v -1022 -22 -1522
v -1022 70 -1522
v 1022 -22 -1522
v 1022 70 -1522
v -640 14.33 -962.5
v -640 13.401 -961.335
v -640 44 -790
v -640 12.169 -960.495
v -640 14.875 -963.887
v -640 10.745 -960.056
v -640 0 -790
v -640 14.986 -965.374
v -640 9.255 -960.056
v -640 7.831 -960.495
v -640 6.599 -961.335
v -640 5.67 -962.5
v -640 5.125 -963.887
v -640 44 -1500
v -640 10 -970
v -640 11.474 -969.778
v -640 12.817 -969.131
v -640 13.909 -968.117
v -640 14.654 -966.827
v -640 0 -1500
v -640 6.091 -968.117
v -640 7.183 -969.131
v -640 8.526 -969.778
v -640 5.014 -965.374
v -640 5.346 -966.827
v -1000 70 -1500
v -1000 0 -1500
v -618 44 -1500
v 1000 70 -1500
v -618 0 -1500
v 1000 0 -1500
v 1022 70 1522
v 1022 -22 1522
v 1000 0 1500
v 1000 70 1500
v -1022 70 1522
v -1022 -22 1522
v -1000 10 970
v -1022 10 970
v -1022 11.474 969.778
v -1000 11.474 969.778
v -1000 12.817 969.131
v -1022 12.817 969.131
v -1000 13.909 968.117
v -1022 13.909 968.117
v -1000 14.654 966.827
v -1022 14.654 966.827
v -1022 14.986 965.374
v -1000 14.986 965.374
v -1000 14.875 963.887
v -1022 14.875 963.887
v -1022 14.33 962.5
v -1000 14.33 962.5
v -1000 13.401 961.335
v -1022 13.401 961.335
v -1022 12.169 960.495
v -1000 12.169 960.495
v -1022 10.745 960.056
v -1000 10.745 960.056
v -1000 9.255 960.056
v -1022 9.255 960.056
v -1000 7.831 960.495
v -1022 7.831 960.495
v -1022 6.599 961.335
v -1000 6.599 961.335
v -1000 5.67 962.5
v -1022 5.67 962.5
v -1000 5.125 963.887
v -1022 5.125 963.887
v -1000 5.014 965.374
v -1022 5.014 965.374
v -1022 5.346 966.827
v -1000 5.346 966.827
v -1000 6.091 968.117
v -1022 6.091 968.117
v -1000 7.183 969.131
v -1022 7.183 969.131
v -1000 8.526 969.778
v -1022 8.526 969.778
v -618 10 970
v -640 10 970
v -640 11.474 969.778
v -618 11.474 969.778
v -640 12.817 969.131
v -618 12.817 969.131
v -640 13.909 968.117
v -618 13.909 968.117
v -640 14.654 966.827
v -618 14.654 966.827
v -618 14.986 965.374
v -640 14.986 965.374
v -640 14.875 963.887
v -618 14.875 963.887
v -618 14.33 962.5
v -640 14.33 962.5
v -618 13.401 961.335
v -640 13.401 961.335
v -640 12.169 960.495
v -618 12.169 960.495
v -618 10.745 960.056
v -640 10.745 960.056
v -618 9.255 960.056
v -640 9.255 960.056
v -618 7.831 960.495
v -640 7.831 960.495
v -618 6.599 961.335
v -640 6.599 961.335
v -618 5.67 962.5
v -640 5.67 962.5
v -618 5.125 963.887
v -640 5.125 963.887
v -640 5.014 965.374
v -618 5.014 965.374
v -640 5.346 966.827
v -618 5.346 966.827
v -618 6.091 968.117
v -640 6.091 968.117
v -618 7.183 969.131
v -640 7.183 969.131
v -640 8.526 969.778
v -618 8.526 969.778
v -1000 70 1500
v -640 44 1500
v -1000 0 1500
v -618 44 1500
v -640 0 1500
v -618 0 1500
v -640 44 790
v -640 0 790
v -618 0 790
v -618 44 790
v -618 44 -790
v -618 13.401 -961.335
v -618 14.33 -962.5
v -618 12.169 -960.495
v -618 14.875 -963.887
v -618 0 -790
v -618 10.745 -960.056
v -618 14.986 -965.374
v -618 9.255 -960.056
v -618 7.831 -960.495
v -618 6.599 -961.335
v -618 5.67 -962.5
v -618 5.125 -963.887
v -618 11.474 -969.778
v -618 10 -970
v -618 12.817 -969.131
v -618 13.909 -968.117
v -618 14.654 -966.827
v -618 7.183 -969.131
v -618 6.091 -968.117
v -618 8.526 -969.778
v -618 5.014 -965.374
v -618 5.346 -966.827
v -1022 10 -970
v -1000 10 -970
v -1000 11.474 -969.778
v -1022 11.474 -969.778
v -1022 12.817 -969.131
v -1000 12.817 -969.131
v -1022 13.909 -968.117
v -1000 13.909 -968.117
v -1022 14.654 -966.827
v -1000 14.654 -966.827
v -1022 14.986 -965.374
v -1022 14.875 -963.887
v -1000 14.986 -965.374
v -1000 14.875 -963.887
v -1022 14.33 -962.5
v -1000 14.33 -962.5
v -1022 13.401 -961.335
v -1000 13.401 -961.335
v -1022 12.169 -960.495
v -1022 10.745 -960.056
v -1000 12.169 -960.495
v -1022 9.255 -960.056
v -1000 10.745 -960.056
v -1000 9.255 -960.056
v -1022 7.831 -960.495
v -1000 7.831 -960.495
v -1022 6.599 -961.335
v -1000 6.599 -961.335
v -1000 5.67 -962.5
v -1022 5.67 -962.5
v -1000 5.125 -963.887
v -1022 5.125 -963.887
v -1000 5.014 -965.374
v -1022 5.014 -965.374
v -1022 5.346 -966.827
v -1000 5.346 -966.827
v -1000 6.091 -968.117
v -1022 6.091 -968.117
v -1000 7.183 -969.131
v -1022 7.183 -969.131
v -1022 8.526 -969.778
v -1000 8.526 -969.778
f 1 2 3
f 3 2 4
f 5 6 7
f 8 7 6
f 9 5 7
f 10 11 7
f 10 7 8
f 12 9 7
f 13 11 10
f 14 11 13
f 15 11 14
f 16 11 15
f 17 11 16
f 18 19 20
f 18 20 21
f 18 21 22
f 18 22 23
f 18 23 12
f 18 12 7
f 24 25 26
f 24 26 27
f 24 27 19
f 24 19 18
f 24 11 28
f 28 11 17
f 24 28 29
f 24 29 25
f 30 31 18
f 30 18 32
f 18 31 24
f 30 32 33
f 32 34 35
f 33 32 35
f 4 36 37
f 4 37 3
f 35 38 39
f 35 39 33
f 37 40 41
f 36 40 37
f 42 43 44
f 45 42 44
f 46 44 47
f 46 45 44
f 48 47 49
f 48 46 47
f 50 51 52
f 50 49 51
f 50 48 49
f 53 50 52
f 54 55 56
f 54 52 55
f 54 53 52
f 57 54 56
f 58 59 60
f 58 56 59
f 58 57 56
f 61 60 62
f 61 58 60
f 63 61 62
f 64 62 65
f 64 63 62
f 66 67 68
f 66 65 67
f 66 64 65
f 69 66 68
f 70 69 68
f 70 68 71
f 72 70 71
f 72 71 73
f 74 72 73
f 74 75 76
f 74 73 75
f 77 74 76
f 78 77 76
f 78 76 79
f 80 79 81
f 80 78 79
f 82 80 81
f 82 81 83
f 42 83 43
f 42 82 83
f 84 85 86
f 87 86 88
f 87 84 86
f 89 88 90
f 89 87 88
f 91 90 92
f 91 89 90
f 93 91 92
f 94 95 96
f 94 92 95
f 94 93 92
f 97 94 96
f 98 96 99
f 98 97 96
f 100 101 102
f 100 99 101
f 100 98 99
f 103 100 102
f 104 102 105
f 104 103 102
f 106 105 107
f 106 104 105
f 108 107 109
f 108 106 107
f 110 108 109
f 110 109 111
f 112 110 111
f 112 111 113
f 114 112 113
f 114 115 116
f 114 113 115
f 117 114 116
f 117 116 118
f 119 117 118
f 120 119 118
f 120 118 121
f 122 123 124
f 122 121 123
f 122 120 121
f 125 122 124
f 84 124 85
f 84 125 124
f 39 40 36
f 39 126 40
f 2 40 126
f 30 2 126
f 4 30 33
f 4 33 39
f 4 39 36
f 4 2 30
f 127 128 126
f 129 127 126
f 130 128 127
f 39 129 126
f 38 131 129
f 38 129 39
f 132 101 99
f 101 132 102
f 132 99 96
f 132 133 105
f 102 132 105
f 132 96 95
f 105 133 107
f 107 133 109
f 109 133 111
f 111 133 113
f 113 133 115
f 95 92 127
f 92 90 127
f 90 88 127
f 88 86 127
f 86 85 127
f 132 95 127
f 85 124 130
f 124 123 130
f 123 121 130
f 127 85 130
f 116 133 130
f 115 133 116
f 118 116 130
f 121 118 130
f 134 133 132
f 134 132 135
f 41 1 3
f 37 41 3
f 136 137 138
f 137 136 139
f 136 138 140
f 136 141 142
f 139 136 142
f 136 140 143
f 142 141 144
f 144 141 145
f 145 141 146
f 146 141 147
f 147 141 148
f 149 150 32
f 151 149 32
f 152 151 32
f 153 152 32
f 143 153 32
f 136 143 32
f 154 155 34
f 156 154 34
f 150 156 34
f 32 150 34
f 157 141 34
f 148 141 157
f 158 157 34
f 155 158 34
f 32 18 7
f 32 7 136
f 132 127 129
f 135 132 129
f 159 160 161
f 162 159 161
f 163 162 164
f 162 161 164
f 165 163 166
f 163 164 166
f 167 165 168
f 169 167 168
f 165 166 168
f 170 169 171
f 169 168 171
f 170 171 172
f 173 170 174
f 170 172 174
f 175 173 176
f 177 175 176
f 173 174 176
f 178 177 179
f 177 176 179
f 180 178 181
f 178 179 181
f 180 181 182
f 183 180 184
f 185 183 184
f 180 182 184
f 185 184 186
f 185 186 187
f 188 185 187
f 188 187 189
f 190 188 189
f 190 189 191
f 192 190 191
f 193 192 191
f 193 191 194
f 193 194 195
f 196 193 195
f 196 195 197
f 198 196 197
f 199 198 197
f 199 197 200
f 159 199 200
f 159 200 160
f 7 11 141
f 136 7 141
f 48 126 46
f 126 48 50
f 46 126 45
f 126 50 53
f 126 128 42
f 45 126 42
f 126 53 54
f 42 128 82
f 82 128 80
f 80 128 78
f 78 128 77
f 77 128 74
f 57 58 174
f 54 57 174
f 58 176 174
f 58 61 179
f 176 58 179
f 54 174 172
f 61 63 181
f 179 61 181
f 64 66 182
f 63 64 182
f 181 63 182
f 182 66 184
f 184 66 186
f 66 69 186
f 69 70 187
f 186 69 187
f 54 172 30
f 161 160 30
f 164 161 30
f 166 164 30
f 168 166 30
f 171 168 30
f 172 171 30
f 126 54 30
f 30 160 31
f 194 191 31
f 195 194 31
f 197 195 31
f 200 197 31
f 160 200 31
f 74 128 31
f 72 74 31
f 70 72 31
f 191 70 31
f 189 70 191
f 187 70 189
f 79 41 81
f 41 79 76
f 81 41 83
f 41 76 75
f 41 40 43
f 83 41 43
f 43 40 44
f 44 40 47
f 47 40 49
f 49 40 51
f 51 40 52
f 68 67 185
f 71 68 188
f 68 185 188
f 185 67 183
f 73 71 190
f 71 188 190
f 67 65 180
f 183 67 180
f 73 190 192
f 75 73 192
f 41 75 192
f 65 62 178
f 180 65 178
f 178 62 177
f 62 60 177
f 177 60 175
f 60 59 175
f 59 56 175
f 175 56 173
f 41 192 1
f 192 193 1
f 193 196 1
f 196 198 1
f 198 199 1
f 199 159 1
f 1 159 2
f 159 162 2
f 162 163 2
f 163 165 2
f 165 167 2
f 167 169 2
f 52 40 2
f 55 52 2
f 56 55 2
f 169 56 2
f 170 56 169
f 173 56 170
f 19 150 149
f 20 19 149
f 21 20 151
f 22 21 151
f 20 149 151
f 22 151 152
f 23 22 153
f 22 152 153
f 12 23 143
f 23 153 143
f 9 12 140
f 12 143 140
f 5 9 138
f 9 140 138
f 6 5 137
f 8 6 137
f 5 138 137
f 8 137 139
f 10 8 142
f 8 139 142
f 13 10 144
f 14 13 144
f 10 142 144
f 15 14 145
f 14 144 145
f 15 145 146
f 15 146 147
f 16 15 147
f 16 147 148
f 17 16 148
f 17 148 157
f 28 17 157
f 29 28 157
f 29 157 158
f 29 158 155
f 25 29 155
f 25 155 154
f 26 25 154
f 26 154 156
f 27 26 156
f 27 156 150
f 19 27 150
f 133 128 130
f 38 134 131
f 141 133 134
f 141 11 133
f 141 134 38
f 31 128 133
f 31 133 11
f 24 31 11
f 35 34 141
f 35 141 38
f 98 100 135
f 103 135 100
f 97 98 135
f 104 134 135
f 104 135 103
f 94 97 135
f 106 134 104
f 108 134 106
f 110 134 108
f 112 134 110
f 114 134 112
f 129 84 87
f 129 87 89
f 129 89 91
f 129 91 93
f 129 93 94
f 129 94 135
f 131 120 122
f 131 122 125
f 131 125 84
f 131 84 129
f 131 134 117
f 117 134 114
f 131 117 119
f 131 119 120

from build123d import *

# Parameters (mm, degrees)
ESQUISSE1_W             = 2000
ESQUISSE1_H             = 3000
BOSS_EXTRU_1_DEPTH      = 22
ESQUISSE2_W             = 2044
ESQUISSE2_H             = 3044
ESQUISSE2_W_2           = 2000
ESQUISSE2_H_2           = 3000
BOSS_EXTRU_2_DEPTH      = 70
BOSS_EXTRU_2_DEPTH_BACK = 22
ESQUISSE3_W             = 22
ESQUISSE3_H             = 710
BOSS_EXTRU_3_DEPTH      = 44
ESQUISSE4_R             = 5
ENL_V_MAT_EXTRU_1_DEPTH = 405


with BuildPart() as part:
    # Esquisse1 → Boss.-Extru.1 (new body)
    with BuildSketch(Plane(origin=(0, 0, 0), x_dir=(1, 0, 0), z_dir=(0, 1, 0))):
        Rectangle(ESQUISSE1_W, ESQUISSE1_H)
    extrude(amount=-BOSS_EXTRU_1_DEPTH)

    # Esquisse2 → Boss.-Extru.2 (add, two sides)
    with BuildSketch(Plane(origin=(0, 0, 0), x_dir=(1, 0, 0), z_dir=(0, 1, 0))) as boss_extru_2_sk:
        Rectangle(ESQUISSE2_W, ESQUISSE2_H)
        Rectangle(ESQUISSE2_W_2, ESQUISSE2_H_2, mode=Mode.SUBTRACT)
    extrude(amount=BOSS_EXTRU_2_DEPTH)
    extrude(boss_extru_2_sk.sketch, amount=-BOSS_EXTRU_2_DEPTH_BACK)

    # Esquisse3 → Boss.-Extru.3 (add)
    with BuildSketch(Plane(origin=(0, 0, 0), x_dir=(1, 0, 0), z_dir=(0, 1, 0))):
        with Locations((-629, 1145)):
            Rectangle(ESQUISSE3_W, ESQUISSE3_H)
    boss_extru_3 = extrude(amount=BOSS_EXTRU_3_DEPTH)

    # Esquisse4 → Enlèv. mat.-Extru.1 (cut, through all)
    with BuildSketch(Plane(origin=(-618, 0, 0), x_dir=(0, 0, -1), z_dir=(1, 0, 0))):
        with Locations((965, 10)):
            Circle(ESQUISSE4_R)
    enl_v_mat_extru_1 = extrude(amount=-ENL_V_MAT_EXTRU_1_DEPTH, mode=Mode.SUBTRACT)

    # Symétrie1: Boss.-Extru.3, Enlèv. mat.-Extru.1 across plane
    add(boss_extru_3.mirror(Plane.XY))
    add(enl_v_mat_extru_1.mirror(Plane.XY), mode=Mode.SUBTRACT)


solid = part.part
